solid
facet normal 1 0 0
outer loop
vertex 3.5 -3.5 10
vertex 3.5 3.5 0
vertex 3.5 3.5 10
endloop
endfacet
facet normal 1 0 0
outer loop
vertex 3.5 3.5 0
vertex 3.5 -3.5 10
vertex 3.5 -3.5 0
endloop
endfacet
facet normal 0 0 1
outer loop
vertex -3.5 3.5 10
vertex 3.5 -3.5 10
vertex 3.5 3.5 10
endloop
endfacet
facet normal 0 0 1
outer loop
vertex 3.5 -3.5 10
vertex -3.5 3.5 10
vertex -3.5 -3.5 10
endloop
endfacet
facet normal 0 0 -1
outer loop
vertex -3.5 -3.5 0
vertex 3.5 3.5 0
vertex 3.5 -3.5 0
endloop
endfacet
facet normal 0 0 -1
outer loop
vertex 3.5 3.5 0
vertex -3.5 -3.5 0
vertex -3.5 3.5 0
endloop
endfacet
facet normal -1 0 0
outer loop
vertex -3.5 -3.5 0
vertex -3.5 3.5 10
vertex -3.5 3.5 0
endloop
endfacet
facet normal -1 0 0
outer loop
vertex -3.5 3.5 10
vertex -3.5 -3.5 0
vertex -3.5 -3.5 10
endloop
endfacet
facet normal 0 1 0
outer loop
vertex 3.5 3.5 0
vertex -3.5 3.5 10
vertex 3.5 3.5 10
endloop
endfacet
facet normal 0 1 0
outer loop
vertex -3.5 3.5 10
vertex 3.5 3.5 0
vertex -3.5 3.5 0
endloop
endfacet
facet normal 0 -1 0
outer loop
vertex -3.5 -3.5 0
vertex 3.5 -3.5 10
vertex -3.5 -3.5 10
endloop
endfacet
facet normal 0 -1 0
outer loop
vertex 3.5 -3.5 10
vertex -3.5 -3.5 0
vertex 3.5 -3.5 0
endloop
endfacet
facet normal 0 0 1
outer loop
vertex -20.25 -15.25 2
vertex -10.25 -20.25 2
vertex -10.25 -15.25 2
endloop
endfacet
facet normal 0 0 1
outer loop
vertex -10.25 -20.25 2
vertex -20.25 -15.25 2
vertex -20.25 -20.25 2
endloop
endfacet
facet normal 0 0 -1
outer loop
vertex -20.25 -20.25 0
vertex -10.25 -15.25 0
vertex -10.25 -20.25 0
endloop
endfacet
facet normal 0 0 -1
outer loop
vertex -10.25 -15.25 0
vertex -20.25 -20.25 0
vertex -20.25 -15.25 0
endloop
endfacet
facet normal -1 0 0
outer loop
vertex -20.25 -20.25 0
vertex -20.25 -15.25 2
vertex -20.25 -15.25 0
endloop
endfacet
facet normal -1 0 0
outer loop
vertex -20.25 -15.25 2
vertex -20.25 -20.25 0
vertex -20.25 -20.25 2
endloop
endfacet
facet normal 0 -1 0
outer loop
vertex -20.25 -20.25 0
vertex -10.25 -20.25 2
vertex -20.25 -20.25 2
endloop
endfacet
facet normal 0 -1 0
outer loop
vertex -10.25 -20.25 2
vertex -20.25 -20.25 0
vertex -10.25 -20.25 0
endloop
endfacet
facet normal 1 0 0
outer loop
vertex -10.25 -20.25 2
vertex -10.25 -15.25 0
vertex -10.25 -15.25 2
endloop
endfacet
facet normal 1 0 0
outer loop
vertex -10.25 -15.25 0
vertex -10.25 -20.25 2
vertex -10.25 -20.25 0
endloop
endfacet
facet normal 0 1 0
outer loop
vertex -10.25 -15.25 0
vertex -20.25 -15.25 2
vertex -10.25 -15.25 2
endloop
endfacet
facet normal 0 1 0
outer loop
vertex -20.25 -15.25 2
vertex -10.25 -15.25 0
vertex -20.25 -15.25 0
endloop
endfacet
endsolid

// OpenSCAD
translate([0, 0, 5]) color([0,1,0,0.9]) cube([7, 7, 10], center=true);
translate([-20.0, -20.0, 1]) color([1,0,0]) cube([0.5, 0.5, 2], center=true);
translate([-19.5, -20.0, 1]) color([1,0,0]) cube([0.5, 0.5, 2], center=true);
translate([-19.0, -20.0, 1]) color([1,0,0]) cube([0.5, 0.5, 2], center=true);
translate([-18.5, -20.0, 1]) color([1,0,0]) cube([0.5, 0.5, 2], center=true);
translate([-18.0, -20.0, 1]) color([1,0,0]) cube([0.5, 0.5, 2], center=true);
translate([-17.5, -20.0, 1]) color([1,0,0]) cube([0.5, 0.5, 2], center=true);
translate([-17.0, -20.0, 1]) color([1,0,0]) cube([0.5, 0.5, 2], center=true);
translate([-16.5, -20.0, 1]) color([1,0,0]) cube([0.5, 0.5, 2], center=true);
translate([-16.0, -20.0, 1]) color([1,0,0]) cube([0.5, 0.5, 2], center=true);
translate([-15.5, -20.0, 1]) color([1,0,0]) cube([0.5, 0.5, 2], center=true);
translate([-15.0, -20.0, 1]) color([1,0,0]) cube([0.5, 0.5, 2], center=true);
translate([-14.5, -20.0, 1]) color([1,0,0]) cube([0.5, 0.5, 2], center=true);
translate([-14.0, -20.0, 1]) color([1,0,0]) cube([0.5, 0.5, 2], center=true);
translate([-13.5, -20.0, 1]) color([1,0,0]) cube([0.5, 0.5, 2], center=true);
translate([-13.0, -20.0, 1]) color([1,0,0]) cube([0.5, 0.5, 2], center=true);
translate([-12.5, -20.0, 1]) color([1,0,0]) cube([0.5, 0.5, 2], center=true);
translate([-12.0, -20.0, 1]) color([1,0,0]) cube([0.5, 0.5, 2], center=true);
translate([-11.5, -20.0, 1]) color([1,0,0]) cube([0.5, 0.5, 2], center=true);
translate([-11.0, -20.0, 1]) color([1,0,0]) cube([0.5, 0.5, 2], center=true);
translate([-10.5, -20.0, 1]) color([1,0,0]) cube([0.5, 0.5, 2], center=true);
translate([-20.0, -19.5, 1]) color([1,0,0]) cube([0.5, 0.5, 2], center=true);
translate([-19.5, -19.5, 1]) color([1,0,0]) cube([0.5, 0.5, 2], center=true);
translate([-19.0, -19.5, 1]) color([1,0,0]) cube([0.5, 0.5, 2], center=true);
translate([-18.5, -19.5, 1]) color([1,0,0]) cube([0.5, 0.5, 2], center=true);
translate([-18.0, -19.5, 1]) color([1,0,0]) cube([0.5, 0.5, 2], center=true);
translate([-17.5, -19.5, 1]) color([1,0,0]) cube([0.5, 0.5, 2], center=true);
translate([-17.0, -19.5, 1]) color([1,0,0]) cube([0.5, 0.5, 2], center=true);
translate([-16.5, -19.5, 1]) color([1,0,0]) cube([0.5, 0.5, 2], center=true);
translate([-16.0, -19.5, 1]) color([1,0,0]) cube([0.5, 0.5, 2], center=true);
translate([-15.5, -19.5, 1]) color([1,0,0]) cube([0.5, 0.5, 2], center=true);
translate([-15.0, -19.5, 1]) color([1,0,0]) cube([0.5, 0.5, 2], center=true);
translate([-14.5, -19.5, 1]) color([1,0,0]) cube([0.5, 0.5, 2], center=true);
translate([-14.0, -19.5, 1]) color([1,0,0]) cube([0.5, 0.5, 2], center=true);
translate([-13.5, -19.5, 1]) color([1,0,0]) cube([0.5, 0.5, 2], center=true);
translate([-13.0, -19.5, 1]) color([1,0,0]) cube([0.5, 0.5, 2], center=true);
translate([-12.5, -19.5, 1]) color([1,0,0]) cube([0.5, 0.5, 2], center=true);
translate([-12.0, -19.5, 1]) color([1,0,0]) cube([0.5, 0.5, 2], center=true);
translate([-11.5, -19.5, 1]) color([1,0,0]) cube([0.5, 0.5, 2], center=true);
translate([-11.0, -19.5, 1]) color([1,0,0]) cube([0.5, 0.5, 2], center=true);
translate([-10.5, -19.5, 1]) color([1,0,0]) cube([0.5, 0.5, 2], center=true);
translate([-20.0, -19.0, 1]) color([1,0,0]) cube([0.5, 0.5, 2], center=true);
translate([-19.5, -19.0, 1]) color([1,0,0]) cube([0.5, 0.5, 2], center=true);
translate([-19.0, -19.0, 1]) color([1,0,0]) cube([0.5, 0.5, 2], center=true);
translate([-18.5, -19.0, 1]) color([1,0,0]) cube([0.5, 0.5, 2], center=true);
translate([-18.0, -19.0, 1]) color([1,0,0]) cube([0.5, 0.5, 2], center=true);
translate([-17.5, -19.0, 1]) color([1,0,0]) cube([0.5, 0.5, 2], center=true);
translate([-17.0, -19.0, 1]) color([1,0,0]) cube([0.5, 0.5, 2], center=true);
translate([-16.5, -19.0, 1]) color([1,0,0]) cube([0.5, 0.5, 2], center=true);
translate([-16.0, -19.0, 1]) color([1,0,0]) cube([0.5, 0.5, 2], center=true);
translate([-15.5, -19.0, 1]) color([1,0,0]) cube([0.5, 0.5, 2], center=true);
translate([-15.0, -19.0, 1]) color([1,0,0]) cube([0.5, 0.5, 2], center=true);
translate([-14.5, -19.0, 1]) color([1,0,0]) cube([0.5, 0.5, 2], center=true);
translate([-14.0, -19.0, 1]) color([1,0,0]) cube([0.5, 0.5, 2], center=true);
translate([-13.5, -19.0, 1]) color([1,0,0]) cube([0.5, 0.5, 2], center=true);
translate([-13.0, -19.0, 1]) color([1,0,0]) cube([0.5, 0.5, 2], center=true);
translate([-12.5, -19.0, 1]) color([1,0,0]) cube([0.5, 0.5, 2], center=true);
translate([-12.0, -19.0, 1]) color([1,0,0]) cube([0.5, 0.5, 2], center=true);
translate([-11.5, -19.0, 1]) color([1,0,0]) cube([0.5, 0.5, 2], center=true);
translate([-11.0, -19.0, 1]) color([1,0,0]) cube([0.5, 0.5, 2], center=true);
translate([-10.5, -19.0, 1]) color([1,0,0]) cube([0.5, 0.5, 2], center=true);
translate([-20.0, -18.5, 1]) color([1,0,0]) cube([0.5, 0.5, 2], center=true);
translate([-19.5, -18.5, 1]) color([1,0,0]) cube([0.5, 0.5, 2], center=true);
translate([-19.0, -18.5, 1]) color([1,0,0]) cube([0.5, 0.5, 2], center=true);
translate([-18.5, -18.5, 1]) color([1,0,0]) cube([0.5, 0.5, 2], center=true);
translate([-18.0, -18.5, 1]) color([1,0,0]) cube([0.5, 0.5, 2], center=true);
translate([-17.5, -18.5, 1]) color([1,0,0]) cube([0.5, 0.5, 2], center=true);
translate([-17.0, -18.5, 1]) color([1,0,0]) cube([0.5, 0.5, 2], center=true);
translate([-16.5, -18.5, 1]) color([1,0,0]) cube([0.5, 0.5, 2], center=true);
translate([-16.0, -18.5, 1]) color([1,0,0]) cube([0.5, 0.5, 2], center=true);
translate([-15.5, -18.5, 1]) color([1,0,0]) cube([0.5, 0.5, 2], center=true);
translate([-15.0, -18.5, 1]) color([1,0,0]) cube([0.5, 0.5, 2], center=true);
translate([-14.5, -18.5, 1]) color([1,0,0]) cube([0.5, 0.5, 2], center=true);
translate([-14.0, -18.5, 1]) color([1,0,0]) cube([0.5, 0.5, 2], center=true);
translate([-13.5, -18.5, 1]) color([1,0,0]) cube([0.5, 0.5, 2], center=true);
translate([-13.0, -18.5, 1]) color([1,0,0]) cube([0.5, 0.5, 2], center=true);
translate([-12.5, -18.5, 1]) color([1,0,0]) cube([0.5, 0.5, 2], center=true);
translate([-12.0, -18.5, 1]) color([1,0,0]) cube([0.5, 0.5, 2], center=true);
translate([-11.5, -18.5, 1]) color([1,0,0]) cube([0.5, 0.5, 2], center=true);
translate([-11.0, -18.5, 1]) color([1,0,0]) cube([0.5, 0.5, 2], center=true);
translate([-10.5, -18.5, 1]) color([1,0,0]) cube([0.5, 0.5, 2], center=true);
translate([-20.0, -18.0, 1]) color([1,0,0]) cube([0.5, 0.5, 2], center=true);
translate([-19.5, -18.0, 1]) color([1,0,0]) cube([0.5, 0.5, 2], center=true);
translate([-19.0, -18.0, 1]) color([1,0,0]) cube([0.5, 0.5, 2], center=true);
translate([-18.5, -18.0, 1]) color([1,0,0]) cube([0.5, 0.5, 2], center=true);
translate([-18.0, -18.0, 1]) color([1,0,0]) cube([0.5, 0.5, 2], center=true);
translate([-17.5, -18.0, 1]) color([1,0,0]) cube([0.5, 0.5, 2], center=true);
translate([-17.0, -18.0, 1]) color([1,0,0]) cube([0.5, 0.5, 2], center=true);
translate([-16.5, -18.0, 1]) color([1,0,0]) cube([0.5, 0.5, 2], center=true);
translate([-16.0, -18.0, 1]) color([1,0,0]) cube([0.5, 0.5, 2], center=true);
translate([-15.5, -18.0, 1]) color([1,0,0]) cube([0.5, 0.5, 2], center=true);
translate([-15.0, -18.0, 1]) color([1,0,0]) cube([0.5, 0.5, 2], center=true);
translate([-14.5, -18.0, 1]) color([1,0,0]) cube([0.5, 0.5, 2], center=true);
translate([-14.0, -18.0, 1]) color([1,0,0]) cube([0.5, 0.5, 2], center=true);
translate([-13.5, -18.0, 1]) color([1,0,0]) cube([0.5, 0.5, 2], center=true);
translate([-13.0, -18.0, 1]) color([1,0,0]) cube([0.5, 0.5, 2], center=true);
translate([-12.5, -18.0, 1]) color([1,0,0]) cube([0.5, 0.5, 2], center=true);
translate([-12.0, -18.0, 1]) color([1,0,0]) cube([0.5, 0.5, 2], center=true);
translate([-11.5, -18.0, 1]) color([1,0,0]) cube([0.5, 0.5, 2], center=true);
translate([-11.0, -18.0, 1]) color([1,0,0]) cube([0.5, 0.5, 2], center=true);
translate([-10.5, -18.0, 1]) color([1,0,0]) cube([0.5, 0.5, 2], center=true);
translate([-20.0, -17.5, 1]) color([1,0,0]) cube([0.5, 0.5, 2], center=true);
translate([-19.5, -17.5, 1]) color([1,0,0]) cube([0.5, 0.5, 2], center=true);
translate([-19.0, -17.5, 1]) color([1,0,0]) cube([0.5, 0.5, 2], center=true);
translate([-18.5, -17.5, 1]) color([1,0,0]) cube([0.5, 0.5, 2], center=true);
translate([-18.0, -17.5, 1]) color([1,0,0]) cube([0.5, 0.5, 2], center=true);
translate([-17.5, -17.5, 1]) color([1,0,0]) cube([0.5, 0.5, 2], center=true);
translate([-17.0, -17.5, 1]) color([1,0,0]) cube([0.5, 0.5, 2], center=true);
translate([-16.5, -17.5, 1]) color([1,0,0]) cube([0.5, 0.5, 2], center=true);
translate([-16.0, -17.5, 1]) color([1,0,0]) cube([0.5, 0.5, 2], center=true);
translate([-15.5, -17.5, 1]) color([1,0,0]) cube([0.5, 0.5, 2], center=true);
translate([-15.0, -17.5, 1]) color([1,0,0]) cube([0.5, 0.5, 2], center=true);
translate([-14.5, -17.5, 1]) color([1,0,0]) cube([0.5, 0.5, 2], center=true);
translate([-14.0, -17.5, 1]) color([1,0,0]) cube([0.5, 0.5, 2], center=true);
translate([-13.5, -17.5, 1]) color([1,0,0]) cube([0.5, 0.5, 2], center=true);
translate([-13.0, -17.5, 1]) color([1,0,0]) cube([0.5, 0.5, 2], center=true);
translate([-12.5, -17.5, 1]) color([1,0,0]) cube([0.5, 0.5, 2], center=true);
translate([-12.0, -17.5, 1]) color([1,0,0]) cube([0.5, 0.5, 2], center=true);
translate([-11.5, -17.5, 1]) color([1,0,0]) cube([0.5, 0.5, 2], center=true);
translate([-11.0, -17.5, 1]) color([1,0,0]) cube([0.5, 0.5, 2], center=true);
translate([-10.5, -17.5, 1]) color([1,0,0]) cube([0.5, 0.5, 2], center=true);
translate([-20.0, -17.0, 1]) color([1,0,0]) cube([0.5, 0.5, 2], center=true);
translate([-19.5, -17.0, 1]) color([1,0,0]) cube([0.5, 0.5, 2], center=true);
translate([-19.0, -17.0, 1]) color([1,0,0]) cube([0.5, 0.5, 2], center=true);
translate([-18.5, -17.0, 1]) color([1,0,0]) cube([0.5, 0.5, 2], center=true);
translate([-18.0, -17.0, 1]) color([1,0,0]) cube([0.5, 0.5, 2], center=true);
translate([-17.5, -17.0, 1]) color([1,0,0]) cube([0.5, 0.5, 2], center=true);
translate([-17.0, -17.0, 1]) color([1,0,0]) cube([0.5, 0.5, 2], center=true);
translate([-16.5, -17.0, 1]) color([1,0,0]) cube([0.5, 0.5, 2], center=true);
translate([-16.0, -17.0, 1]) color([1,0,0]) cube([0.5, 0.5, 2], center=true);
translate([-15.5, -17.0, 1]) color([1,0,0]) cube([0.5, 0.5, 2], center=true);
translate([-15.0, -17.0, 1]) color([1,0,0]) cube([0.5, 0.5, 2], center=true);
translate([-14.5, -17.0, 1]) color([1,0,0]) cube([0.5, 0.5, 2], center=true);
translate([-14.0, -17.0, 1]) color([1,0,0]) cube([0.5, 0.5, 2], center=true);
translate([-13.5, -17.0, 1]) color([1,0,0]) cube([0.5, 0.5, 2], center=true);
translate([-13.0, -17.0, 1]) color([1,0,0]) cube([0.5, 0.5, 2], center=true);
translate([-12.5, -17.0, 1]) color([1,0,0]) cube([0.5, 0.5, 2], center=true);
translate([-12.0, -17.0, 1]) color([1,0,0]) cube([0.5, 0.5, 2], center=true);
translate([-11.5, -17.0, 1]) color([1,0,0]) cube([0.5, 0.5, 2], center=true);
translate([-11.0, -17.0, 1]) color([1,0,0]) cube([0.5, 0.5, 2], center=true);
translate([-10.5, -17.0, 1]) color([1,0,0]) cube([0.5, 0.5, 2], center=true);
translate([-20.0, -16.5, 1]) color([1,0,0]) cube([0.5, 0.5, 2], center=true);
translate([-19.5, -16.5, 1]) color([1,0,0]) cube([0.5, 0.5, 2], center=true);
translate([-19.0, -16.5, 1]) color([1,0,0]) cube([0.5, 0.5, 2], center=true);
translate([-18.5, -16.5, 1]) color([1,0,0]) cube([0.5, 0.5, 2], center=true);
translate([-18.0, -16.5, 1]) color([1,0,0]) cube([0.5, 0.5, 2], center=true);
translate([-17.5, -16.5, 1]) color([1,0,0]) cube([0.5, 0.5, 2], center=true);
translate([-17.0, -16.5, 1]) color([1,0,0]) cube([0.5, 0.5, 2], center=true);
translate([-16.5, -16.5, 1]) color([1,0,0]) cube([0.5, 0.5, 2], center=true);
translate([-16.0, -16.5, 1]) color([1,0,0]) cube([0.5, 0.5, 2], center=true);
translate([-15.5, -16.5, 1]) color([1,0,0]) cube([0.5, 0.5, 2], center=true);
translate([-15.0, -16.5, 1]) color([1,0,0]) cube([0.5, 0.5, 2], center=true);
translate([-14.5, -16.5, 1]) color([1,0,0]) cube([0.5, 0.5, 2], center=true);
translate([-14.0, -16.5, 1]) color([1,0,0]) cube([0.5, 0.5, 2], center=true);
translate([-13.5, -16.5, 1]) color([1,0,0]) cube([0.5, 0.5, 2], center=true);
translate([-13.0, -16.5, 1]) color([1,0,0]) cube([0.5, 0.5, 2], center=true);
translate([-12.5, -16.5, 1]) color([1,0,0]) cube([0.5, 0.5, 2], center=true);
translate([-12.0, -16.5, 1]) color([1,0,0]) cube([0.5, 0.5, 2], center=true);
translate([-11.5, -16.5, 1]) color([1,0,0]) cube([0.5, 0.5, 2], center=true);
translate([-11.0, -16.5, 1]) color([1,0,0]) cube([0.5, 0.5, 2], center=true);
translate([-10.5, -16.5, 1]) color([1,0,0]) cube([0.5, 0.5, 2], center=true);
translate([-20.0, -16.0, 1]) color([1,0,0]) cube([0.5, 0.5, 2], center=true);
translate([-19.5, -16.0, 1]) color([1,0,0]) cube([0.5, 0.5, 2], center=true);
translate([-19.0, -16.0, 1]) color([1,0,0]) cube([0.5, 0.5, 2], center=true);
translate([-18.5, -16.0, 1]) color([1,0,0]) cube([0.5, 0.5, 2], center=true);
translate([-18.0, -16.0, 1]) color([1,0,0]) cube([0.5, 0.5, 2], center=true);
translate([-17.5, -16.0, 1]) color([1,0,0]) cube([0.5, 0.5, 2], center=true);
translate([-17.0, -16.0, 1]) color([1,0,0]) cube([0.5, 0.5, 2], center=true);
translate([-16.5, -16.0, 1]) color([1,0,0]) cube([0.5, 0.5, 2], center=true);
translate([-16.0, -16.0, 1]) color([1,0,0]) cube([0.5, 0.5, 2], center=true);
translate([-15.5, -16.0, 1]) color([1,0,0]) cube([0.5, 0.5, 2], center=true);
translate([-15.0, -16.0, 1]) color([1,0,0]) cube([0.5, 0.5, 2], center=true);
translate([-14.5, -16.0, 1]) color([1,0,0]) cube([0.5, 0.5, 2], center=true);
translate([-14.0, -16.0, 1]) color([1,0,0]) cube([0.5, 0.5, 2], center=true);
translate([-13.5, -16.0, 1]) color([1,0,0]) cube([0.5, 0.5, 2], center=true);
translate([-13.0, -16.0, 1]) color([1,0,0]) cube([0.5, 0.5, 2], center=true);
translate([-12.5, -16.0, 1]) color([1,0,0]) cube([0.5, 0.5, 2], center=true);
translate([-12.0, -16.0, 1]) color([1,0,0]) cube([0.5, 0.5, 2], center=true);
translate([-11.5, -16.0, 1]) color([1,0,0]) cube([0.5, 0.5, 2], center=true);
translate([-11.0, -16.0, 1]) color([1,0,0]) cube([0.5, 0.5, 2], center=true);
translate([-10.5, -16.0, 1]) color([1,0,0]) cube([0.5, 0.5, 2], center=true);
translate([-20.0, -15.5, 1]) color([1,0,0]) cube([0.5, 0.5, 2], center=true);
translate([-19.5, -15.5, 1]) color([1,0,0]) cube([0.5, 0.5, 2], center=true);
translate([-19.0, -15.5, 1]) color([1,0,0]) cube([0.5, 0.5, 2], center=true);
translate([-18.5, -15.5, 1]) color([1,0,0]) cube([0.5, 0.5, 2], center=true);
translate([-18.0, -15.5, 1]) color([1,0,0]) cube([0.5, 0.5, 2], center=true);
translate([-17.5, -15.5, 1]) color([1,0,0]) cube([0.5, 0.5, 2], center=true);
translate([-17.0, -15.5, 1]) color([1,0,0]) cube([0.5, 0.5, 2], center=true);
translate([-16.5, -15.5, 1]) color([1,0,0]) cube([0.5, 0.5, 2], center=true);
translate([-16.0, -15.5, 1]) color([1,0,0]) cube([0.5, 0.5, 2], center=true);
translate([-15.5, -15.5, 1]) color([1,0,0]) cube([0.5, 0.5, 2], center=true);
translate([-15.0, -15.5, 1]) color([1,0,0]) cube([0.5, 0.5, 2], center=true);
translate([-14.5, -15.5, 1]) color([1,0,0]) cube([0.5, 0.5, 2], center=true);
translate([-14.0, -15.5, 1]) color([1,0,0]) cube([0.5, 0.5, 2], center=true);
translate([-13.5, -15.5, 1]) color([1,0,0]) cube([0.5, 0.5, 2], center=true);
translate([-13.0, -15.5, 1]) color([1,0,0]) cube([0.5, 0.5, 2], center=true);
translate([-12.5, -15.5, 1]) color([1,0,0]) cube([0.5, 0.5, 2], center=true);
translate([-12.0, -15.5, 1]) color([1,0,0]) cube([0.5, 0.5, 2], center=true);
translate([-11.5, -15.5, 1]) color([1,0,0]) cube([0.5, 0.5, 2], center=true);
translate([-11.0, -15.5, 1]) color([1,0,0]) cube([0.5, 0.5, 2], center=true);
translate([-10.5, -15.5, 1]) color([1,0,0]) cube([0.5, 0.5, 2], center=true);
